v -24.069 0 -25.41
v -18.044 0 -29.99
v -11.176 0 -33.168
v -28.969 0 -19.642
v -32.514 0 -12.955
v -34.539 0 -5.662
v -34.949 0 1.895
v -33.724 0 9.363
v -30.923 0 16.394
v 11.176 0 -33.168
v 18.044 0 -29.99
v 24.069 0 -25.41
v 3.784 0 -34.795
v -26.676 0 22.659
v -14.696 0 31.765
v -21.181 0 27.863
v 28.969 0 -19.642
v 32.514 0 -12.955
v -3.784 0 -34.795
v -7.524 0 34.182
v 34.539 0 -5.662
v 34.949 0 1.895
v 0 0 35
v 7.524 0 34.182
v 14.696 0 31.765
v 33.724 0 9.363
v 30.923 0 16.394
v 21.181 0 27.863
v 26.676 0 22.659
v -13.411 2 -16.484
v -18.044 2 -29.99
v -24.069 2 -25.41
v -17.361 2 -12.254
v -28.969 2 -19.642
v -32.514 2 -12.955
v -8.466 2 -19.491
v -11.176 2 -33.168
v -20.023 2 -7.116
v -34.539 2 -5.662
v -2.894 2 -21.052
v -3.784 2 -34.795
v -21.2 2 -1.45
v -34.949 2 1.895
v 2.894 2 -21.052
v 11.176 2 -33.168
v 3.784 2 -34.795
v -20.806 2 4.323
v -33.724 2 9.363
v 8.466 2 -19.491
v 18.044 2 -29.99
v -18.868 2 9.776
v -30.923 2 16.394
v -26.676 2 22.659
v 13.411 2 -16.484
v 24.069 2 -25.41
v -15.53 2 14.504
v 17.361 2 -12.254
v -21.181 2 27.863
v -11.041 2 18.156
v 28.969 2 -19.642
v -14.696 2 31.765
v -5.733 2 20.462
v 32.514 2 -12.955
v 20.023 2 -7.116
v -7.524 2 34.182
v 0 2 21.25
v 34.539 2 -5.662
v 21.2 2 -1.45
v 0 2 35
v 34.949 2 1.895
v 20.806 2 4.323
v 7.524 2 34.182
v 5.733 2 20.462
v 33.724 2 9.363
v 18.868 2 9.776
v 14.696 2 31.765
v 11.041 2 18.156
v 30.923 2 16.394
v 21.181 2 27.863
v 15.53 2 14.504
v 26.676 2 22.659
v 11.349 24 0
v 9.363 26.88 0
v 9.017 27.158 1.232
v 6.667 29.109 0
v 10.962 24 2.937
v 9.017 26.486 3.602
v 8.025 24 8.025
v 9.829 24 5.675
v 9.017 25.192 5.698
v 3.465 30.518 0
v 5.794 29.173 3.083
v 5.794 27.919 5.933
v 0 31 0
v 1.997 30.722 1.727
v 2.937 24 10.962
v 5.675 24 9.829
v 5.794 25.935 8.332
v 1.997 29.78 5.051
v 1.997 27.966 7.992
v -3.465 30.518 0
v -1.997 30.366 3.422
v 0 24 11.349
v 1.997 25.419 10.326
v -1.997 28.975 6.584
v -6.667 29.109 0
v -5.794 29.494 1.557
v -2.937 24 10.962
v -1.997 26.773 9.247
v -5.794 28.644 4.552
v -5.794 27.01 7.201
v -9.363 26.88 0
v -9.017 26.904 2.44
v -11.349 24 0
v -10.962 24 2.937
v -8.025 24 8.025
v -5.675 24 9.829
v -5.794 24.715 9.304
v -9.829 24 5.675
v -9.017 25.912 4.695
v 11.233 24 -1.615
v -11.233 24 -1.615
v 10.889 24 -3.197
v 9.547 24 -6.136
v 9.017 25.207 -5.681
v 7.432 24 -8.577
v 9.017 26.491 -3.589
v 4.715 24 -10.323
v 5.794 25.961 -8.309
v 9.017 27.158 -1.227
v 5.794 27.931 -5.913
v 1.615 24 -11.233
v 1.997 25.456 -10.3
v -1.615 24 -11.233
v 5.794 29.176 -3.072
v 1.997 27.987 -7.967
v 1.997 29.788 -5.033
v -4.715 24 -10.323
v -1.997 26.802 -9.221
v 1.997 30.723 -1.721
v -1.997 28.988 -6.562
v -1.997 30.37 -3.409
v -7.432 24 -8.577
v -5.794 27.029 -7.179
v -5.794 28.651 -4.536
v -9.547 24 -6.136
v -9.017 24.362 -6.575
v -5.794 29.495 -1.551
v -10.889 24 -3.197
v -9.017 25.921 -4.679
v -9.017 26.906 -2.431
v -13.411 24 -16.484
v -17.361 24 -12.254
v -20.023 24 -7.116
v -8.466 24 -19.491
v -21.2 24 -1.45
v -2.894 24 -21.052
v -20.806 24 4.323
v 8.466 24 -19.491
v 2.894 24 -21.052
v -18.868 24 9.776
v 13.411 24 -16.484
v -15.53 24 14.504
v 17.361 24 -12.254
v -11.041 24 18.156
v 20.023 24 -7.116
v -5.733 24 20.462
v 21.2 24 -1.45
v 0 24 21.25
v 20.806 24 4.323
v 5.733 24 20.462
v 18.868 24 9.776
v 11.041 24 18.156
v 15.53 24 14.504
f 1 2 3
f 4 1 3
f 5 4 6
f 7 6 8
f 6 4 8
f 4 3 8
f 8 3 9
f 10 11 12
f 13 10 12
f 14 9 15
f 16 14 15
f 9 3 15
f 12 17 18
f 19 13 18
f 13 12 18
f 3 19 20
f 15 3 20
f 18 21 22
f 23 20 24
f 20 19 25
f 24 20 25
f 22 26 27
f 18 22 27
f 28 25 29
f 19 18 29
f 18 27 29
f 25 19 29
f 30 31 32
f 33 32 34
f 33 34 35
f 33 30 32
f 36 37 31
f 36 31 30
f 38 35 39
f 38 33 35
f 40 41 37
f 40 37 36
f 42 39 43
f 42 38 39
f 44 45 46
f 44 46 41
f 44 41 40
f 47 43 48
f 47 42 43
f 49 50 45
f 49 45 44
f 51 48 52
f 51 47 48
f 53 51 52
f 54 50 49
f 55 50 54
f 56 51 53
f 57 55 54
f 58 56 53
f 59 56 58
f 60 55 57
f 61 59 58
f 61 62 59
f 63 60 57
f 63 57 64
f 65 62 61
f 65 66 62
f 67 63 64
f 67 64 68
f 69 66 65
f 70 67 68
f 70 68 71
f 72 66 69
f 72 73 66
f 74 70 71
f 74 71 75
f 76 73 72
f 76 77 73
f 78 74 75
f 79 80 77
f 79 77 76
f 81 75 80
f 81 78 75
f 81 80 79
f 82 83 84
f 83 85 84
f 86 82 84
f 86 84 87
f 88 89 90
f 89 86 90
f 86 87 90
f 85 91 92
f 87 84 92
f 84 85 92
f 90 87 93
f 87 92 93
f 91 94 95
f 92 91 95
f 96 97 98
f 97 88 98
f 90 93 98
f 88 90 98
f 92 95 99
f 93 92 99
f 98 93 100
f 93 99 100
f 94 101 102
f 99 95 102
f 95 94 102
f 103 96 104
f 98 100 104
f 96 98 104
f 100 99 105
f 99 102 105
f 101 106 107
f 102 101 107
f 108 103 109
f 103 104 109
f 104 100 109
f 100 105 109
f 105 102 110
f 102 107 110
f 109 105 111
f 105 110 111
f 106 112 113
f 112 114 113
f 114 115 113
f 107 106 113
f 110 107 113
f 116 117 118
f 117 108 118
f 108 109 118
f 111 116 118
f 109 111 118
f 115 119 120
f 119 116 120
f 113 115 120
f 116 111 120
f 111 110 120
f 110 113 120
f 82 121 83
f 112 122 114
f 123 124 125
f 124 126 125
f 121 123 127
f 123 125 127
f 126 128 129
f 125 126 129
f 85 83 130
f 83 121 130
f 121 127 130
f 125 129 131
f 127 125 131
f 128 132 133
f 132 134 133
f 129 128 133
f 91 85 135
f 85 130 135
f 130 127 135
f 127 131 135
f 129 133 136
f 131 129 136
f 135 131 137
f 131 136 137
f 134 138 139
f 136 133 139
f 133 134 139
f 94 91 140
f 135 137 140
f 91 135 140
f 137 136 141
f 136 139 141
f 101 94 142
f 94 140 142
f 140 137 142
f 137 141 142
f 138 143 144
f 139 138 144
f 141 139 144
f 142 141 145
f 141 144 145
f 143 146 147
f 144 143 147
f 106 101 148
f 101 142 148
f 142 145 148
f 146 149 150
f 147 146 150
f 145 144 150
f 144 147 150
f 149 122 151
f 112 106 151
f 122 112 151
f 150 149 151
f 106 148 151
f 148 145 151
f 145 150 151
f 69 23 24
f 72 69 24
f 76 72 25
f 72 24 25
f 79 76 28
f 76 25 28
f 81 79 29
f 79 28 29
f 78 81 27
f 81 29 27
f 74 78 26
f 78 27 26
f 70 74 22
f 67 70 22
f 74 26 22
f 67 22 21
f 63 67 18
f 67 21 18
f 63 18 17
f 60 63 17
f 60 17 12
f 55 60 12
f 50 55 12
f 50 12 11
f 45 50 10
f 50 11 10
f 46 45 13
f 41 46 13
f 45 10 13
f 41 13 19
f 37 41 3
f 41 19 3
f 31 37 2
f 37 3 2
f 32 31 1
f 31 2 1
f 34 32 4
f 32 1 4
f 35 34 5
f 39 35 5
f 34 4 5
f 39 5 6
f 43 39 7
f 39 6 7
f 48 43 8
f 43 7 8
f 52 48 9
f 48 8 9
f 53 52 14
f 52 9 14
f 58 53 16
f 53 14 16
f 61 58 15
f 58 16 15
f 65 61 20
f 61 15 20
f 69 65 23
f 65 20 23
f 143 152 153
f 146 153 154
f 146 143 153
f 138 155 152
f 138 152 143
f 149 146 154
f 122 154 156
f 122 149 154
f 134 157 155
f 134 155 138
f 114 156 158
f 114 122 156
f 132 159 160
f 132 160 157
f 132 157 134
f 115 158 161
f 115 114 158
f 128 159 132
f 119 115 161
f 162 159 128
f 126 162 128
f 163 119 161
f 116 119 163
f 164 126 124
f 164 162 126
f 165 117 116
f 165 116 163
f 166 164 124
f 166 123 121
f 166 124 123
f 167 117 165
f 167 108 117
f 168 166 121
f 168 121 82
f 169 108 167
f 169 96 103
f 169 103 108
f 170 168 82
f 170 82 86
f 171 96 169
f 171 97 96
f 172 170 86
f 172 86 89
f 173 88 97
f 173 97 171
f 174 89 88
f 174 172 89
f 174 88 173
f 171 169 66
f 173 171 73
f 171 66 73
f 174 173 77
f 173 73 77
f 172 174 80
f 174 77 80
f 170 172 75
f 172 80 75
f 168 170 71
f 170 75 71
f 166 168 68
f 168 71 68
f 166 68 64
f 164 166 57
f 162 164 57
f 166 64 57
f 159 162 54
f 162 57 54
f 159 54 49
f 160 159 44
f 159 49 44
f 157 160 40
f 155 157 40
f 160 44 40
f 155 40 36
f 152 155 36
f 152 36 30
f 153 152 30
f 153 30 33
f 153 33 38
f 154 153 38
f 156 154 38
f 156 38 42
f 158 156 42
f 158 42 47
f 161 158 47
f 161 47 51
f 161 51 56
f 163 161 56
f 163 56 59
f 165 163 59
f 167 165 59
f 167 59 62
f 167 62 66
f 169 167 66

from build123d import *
from build123d.topology import SkipClean

# Parameters (mm, degrees)
SKETCH_1_R      = 35
EXTRUDE_1_DEPTH = 2
SKETCH_1_3_R    = 21.25
EXTRUDE_2_DEPTH = 24


with BuildPart() as part:
    # 草图1 → 凸台-拉伸1 (new body)
    with BuildSketch(Plane(origin=(0, 0, 0), x_dir=(1, 0, 0), z_dir=(0, 1, 0))):
        Circle(SKETCH_1_R)
    extrude(amount=EXTRUDE_1_DEPTH)

    # 草图1<3> → 凸台-拉伸2 (add)
    with BuildSketch(Plane(origin=(0, 0, 0), x_dir=(1, 0, 0), z_dir=(0, 1, 0))):
        Circle(SKETCH_1_3_R)
    extrude(amount=EXTRUDE_2_DEPTH)

    # 草图2 → 旋转1 (revolve)
    with SkipClean():  # the faces are left unmerged after this step: merging them gives an invalid solid
        with BuildSketch(Plane.XY):
            with BuildLine():
                ThreePointArc((12.7, 18.3), (0, 31), (-12.7, 18.3))
                Line((-12.7, 18.3), (12.7, 18.3))
            make_face()
        revolve(axis=Axis((-1000, 18.3, 0), (1, 0, 0)))


solid = part.part
